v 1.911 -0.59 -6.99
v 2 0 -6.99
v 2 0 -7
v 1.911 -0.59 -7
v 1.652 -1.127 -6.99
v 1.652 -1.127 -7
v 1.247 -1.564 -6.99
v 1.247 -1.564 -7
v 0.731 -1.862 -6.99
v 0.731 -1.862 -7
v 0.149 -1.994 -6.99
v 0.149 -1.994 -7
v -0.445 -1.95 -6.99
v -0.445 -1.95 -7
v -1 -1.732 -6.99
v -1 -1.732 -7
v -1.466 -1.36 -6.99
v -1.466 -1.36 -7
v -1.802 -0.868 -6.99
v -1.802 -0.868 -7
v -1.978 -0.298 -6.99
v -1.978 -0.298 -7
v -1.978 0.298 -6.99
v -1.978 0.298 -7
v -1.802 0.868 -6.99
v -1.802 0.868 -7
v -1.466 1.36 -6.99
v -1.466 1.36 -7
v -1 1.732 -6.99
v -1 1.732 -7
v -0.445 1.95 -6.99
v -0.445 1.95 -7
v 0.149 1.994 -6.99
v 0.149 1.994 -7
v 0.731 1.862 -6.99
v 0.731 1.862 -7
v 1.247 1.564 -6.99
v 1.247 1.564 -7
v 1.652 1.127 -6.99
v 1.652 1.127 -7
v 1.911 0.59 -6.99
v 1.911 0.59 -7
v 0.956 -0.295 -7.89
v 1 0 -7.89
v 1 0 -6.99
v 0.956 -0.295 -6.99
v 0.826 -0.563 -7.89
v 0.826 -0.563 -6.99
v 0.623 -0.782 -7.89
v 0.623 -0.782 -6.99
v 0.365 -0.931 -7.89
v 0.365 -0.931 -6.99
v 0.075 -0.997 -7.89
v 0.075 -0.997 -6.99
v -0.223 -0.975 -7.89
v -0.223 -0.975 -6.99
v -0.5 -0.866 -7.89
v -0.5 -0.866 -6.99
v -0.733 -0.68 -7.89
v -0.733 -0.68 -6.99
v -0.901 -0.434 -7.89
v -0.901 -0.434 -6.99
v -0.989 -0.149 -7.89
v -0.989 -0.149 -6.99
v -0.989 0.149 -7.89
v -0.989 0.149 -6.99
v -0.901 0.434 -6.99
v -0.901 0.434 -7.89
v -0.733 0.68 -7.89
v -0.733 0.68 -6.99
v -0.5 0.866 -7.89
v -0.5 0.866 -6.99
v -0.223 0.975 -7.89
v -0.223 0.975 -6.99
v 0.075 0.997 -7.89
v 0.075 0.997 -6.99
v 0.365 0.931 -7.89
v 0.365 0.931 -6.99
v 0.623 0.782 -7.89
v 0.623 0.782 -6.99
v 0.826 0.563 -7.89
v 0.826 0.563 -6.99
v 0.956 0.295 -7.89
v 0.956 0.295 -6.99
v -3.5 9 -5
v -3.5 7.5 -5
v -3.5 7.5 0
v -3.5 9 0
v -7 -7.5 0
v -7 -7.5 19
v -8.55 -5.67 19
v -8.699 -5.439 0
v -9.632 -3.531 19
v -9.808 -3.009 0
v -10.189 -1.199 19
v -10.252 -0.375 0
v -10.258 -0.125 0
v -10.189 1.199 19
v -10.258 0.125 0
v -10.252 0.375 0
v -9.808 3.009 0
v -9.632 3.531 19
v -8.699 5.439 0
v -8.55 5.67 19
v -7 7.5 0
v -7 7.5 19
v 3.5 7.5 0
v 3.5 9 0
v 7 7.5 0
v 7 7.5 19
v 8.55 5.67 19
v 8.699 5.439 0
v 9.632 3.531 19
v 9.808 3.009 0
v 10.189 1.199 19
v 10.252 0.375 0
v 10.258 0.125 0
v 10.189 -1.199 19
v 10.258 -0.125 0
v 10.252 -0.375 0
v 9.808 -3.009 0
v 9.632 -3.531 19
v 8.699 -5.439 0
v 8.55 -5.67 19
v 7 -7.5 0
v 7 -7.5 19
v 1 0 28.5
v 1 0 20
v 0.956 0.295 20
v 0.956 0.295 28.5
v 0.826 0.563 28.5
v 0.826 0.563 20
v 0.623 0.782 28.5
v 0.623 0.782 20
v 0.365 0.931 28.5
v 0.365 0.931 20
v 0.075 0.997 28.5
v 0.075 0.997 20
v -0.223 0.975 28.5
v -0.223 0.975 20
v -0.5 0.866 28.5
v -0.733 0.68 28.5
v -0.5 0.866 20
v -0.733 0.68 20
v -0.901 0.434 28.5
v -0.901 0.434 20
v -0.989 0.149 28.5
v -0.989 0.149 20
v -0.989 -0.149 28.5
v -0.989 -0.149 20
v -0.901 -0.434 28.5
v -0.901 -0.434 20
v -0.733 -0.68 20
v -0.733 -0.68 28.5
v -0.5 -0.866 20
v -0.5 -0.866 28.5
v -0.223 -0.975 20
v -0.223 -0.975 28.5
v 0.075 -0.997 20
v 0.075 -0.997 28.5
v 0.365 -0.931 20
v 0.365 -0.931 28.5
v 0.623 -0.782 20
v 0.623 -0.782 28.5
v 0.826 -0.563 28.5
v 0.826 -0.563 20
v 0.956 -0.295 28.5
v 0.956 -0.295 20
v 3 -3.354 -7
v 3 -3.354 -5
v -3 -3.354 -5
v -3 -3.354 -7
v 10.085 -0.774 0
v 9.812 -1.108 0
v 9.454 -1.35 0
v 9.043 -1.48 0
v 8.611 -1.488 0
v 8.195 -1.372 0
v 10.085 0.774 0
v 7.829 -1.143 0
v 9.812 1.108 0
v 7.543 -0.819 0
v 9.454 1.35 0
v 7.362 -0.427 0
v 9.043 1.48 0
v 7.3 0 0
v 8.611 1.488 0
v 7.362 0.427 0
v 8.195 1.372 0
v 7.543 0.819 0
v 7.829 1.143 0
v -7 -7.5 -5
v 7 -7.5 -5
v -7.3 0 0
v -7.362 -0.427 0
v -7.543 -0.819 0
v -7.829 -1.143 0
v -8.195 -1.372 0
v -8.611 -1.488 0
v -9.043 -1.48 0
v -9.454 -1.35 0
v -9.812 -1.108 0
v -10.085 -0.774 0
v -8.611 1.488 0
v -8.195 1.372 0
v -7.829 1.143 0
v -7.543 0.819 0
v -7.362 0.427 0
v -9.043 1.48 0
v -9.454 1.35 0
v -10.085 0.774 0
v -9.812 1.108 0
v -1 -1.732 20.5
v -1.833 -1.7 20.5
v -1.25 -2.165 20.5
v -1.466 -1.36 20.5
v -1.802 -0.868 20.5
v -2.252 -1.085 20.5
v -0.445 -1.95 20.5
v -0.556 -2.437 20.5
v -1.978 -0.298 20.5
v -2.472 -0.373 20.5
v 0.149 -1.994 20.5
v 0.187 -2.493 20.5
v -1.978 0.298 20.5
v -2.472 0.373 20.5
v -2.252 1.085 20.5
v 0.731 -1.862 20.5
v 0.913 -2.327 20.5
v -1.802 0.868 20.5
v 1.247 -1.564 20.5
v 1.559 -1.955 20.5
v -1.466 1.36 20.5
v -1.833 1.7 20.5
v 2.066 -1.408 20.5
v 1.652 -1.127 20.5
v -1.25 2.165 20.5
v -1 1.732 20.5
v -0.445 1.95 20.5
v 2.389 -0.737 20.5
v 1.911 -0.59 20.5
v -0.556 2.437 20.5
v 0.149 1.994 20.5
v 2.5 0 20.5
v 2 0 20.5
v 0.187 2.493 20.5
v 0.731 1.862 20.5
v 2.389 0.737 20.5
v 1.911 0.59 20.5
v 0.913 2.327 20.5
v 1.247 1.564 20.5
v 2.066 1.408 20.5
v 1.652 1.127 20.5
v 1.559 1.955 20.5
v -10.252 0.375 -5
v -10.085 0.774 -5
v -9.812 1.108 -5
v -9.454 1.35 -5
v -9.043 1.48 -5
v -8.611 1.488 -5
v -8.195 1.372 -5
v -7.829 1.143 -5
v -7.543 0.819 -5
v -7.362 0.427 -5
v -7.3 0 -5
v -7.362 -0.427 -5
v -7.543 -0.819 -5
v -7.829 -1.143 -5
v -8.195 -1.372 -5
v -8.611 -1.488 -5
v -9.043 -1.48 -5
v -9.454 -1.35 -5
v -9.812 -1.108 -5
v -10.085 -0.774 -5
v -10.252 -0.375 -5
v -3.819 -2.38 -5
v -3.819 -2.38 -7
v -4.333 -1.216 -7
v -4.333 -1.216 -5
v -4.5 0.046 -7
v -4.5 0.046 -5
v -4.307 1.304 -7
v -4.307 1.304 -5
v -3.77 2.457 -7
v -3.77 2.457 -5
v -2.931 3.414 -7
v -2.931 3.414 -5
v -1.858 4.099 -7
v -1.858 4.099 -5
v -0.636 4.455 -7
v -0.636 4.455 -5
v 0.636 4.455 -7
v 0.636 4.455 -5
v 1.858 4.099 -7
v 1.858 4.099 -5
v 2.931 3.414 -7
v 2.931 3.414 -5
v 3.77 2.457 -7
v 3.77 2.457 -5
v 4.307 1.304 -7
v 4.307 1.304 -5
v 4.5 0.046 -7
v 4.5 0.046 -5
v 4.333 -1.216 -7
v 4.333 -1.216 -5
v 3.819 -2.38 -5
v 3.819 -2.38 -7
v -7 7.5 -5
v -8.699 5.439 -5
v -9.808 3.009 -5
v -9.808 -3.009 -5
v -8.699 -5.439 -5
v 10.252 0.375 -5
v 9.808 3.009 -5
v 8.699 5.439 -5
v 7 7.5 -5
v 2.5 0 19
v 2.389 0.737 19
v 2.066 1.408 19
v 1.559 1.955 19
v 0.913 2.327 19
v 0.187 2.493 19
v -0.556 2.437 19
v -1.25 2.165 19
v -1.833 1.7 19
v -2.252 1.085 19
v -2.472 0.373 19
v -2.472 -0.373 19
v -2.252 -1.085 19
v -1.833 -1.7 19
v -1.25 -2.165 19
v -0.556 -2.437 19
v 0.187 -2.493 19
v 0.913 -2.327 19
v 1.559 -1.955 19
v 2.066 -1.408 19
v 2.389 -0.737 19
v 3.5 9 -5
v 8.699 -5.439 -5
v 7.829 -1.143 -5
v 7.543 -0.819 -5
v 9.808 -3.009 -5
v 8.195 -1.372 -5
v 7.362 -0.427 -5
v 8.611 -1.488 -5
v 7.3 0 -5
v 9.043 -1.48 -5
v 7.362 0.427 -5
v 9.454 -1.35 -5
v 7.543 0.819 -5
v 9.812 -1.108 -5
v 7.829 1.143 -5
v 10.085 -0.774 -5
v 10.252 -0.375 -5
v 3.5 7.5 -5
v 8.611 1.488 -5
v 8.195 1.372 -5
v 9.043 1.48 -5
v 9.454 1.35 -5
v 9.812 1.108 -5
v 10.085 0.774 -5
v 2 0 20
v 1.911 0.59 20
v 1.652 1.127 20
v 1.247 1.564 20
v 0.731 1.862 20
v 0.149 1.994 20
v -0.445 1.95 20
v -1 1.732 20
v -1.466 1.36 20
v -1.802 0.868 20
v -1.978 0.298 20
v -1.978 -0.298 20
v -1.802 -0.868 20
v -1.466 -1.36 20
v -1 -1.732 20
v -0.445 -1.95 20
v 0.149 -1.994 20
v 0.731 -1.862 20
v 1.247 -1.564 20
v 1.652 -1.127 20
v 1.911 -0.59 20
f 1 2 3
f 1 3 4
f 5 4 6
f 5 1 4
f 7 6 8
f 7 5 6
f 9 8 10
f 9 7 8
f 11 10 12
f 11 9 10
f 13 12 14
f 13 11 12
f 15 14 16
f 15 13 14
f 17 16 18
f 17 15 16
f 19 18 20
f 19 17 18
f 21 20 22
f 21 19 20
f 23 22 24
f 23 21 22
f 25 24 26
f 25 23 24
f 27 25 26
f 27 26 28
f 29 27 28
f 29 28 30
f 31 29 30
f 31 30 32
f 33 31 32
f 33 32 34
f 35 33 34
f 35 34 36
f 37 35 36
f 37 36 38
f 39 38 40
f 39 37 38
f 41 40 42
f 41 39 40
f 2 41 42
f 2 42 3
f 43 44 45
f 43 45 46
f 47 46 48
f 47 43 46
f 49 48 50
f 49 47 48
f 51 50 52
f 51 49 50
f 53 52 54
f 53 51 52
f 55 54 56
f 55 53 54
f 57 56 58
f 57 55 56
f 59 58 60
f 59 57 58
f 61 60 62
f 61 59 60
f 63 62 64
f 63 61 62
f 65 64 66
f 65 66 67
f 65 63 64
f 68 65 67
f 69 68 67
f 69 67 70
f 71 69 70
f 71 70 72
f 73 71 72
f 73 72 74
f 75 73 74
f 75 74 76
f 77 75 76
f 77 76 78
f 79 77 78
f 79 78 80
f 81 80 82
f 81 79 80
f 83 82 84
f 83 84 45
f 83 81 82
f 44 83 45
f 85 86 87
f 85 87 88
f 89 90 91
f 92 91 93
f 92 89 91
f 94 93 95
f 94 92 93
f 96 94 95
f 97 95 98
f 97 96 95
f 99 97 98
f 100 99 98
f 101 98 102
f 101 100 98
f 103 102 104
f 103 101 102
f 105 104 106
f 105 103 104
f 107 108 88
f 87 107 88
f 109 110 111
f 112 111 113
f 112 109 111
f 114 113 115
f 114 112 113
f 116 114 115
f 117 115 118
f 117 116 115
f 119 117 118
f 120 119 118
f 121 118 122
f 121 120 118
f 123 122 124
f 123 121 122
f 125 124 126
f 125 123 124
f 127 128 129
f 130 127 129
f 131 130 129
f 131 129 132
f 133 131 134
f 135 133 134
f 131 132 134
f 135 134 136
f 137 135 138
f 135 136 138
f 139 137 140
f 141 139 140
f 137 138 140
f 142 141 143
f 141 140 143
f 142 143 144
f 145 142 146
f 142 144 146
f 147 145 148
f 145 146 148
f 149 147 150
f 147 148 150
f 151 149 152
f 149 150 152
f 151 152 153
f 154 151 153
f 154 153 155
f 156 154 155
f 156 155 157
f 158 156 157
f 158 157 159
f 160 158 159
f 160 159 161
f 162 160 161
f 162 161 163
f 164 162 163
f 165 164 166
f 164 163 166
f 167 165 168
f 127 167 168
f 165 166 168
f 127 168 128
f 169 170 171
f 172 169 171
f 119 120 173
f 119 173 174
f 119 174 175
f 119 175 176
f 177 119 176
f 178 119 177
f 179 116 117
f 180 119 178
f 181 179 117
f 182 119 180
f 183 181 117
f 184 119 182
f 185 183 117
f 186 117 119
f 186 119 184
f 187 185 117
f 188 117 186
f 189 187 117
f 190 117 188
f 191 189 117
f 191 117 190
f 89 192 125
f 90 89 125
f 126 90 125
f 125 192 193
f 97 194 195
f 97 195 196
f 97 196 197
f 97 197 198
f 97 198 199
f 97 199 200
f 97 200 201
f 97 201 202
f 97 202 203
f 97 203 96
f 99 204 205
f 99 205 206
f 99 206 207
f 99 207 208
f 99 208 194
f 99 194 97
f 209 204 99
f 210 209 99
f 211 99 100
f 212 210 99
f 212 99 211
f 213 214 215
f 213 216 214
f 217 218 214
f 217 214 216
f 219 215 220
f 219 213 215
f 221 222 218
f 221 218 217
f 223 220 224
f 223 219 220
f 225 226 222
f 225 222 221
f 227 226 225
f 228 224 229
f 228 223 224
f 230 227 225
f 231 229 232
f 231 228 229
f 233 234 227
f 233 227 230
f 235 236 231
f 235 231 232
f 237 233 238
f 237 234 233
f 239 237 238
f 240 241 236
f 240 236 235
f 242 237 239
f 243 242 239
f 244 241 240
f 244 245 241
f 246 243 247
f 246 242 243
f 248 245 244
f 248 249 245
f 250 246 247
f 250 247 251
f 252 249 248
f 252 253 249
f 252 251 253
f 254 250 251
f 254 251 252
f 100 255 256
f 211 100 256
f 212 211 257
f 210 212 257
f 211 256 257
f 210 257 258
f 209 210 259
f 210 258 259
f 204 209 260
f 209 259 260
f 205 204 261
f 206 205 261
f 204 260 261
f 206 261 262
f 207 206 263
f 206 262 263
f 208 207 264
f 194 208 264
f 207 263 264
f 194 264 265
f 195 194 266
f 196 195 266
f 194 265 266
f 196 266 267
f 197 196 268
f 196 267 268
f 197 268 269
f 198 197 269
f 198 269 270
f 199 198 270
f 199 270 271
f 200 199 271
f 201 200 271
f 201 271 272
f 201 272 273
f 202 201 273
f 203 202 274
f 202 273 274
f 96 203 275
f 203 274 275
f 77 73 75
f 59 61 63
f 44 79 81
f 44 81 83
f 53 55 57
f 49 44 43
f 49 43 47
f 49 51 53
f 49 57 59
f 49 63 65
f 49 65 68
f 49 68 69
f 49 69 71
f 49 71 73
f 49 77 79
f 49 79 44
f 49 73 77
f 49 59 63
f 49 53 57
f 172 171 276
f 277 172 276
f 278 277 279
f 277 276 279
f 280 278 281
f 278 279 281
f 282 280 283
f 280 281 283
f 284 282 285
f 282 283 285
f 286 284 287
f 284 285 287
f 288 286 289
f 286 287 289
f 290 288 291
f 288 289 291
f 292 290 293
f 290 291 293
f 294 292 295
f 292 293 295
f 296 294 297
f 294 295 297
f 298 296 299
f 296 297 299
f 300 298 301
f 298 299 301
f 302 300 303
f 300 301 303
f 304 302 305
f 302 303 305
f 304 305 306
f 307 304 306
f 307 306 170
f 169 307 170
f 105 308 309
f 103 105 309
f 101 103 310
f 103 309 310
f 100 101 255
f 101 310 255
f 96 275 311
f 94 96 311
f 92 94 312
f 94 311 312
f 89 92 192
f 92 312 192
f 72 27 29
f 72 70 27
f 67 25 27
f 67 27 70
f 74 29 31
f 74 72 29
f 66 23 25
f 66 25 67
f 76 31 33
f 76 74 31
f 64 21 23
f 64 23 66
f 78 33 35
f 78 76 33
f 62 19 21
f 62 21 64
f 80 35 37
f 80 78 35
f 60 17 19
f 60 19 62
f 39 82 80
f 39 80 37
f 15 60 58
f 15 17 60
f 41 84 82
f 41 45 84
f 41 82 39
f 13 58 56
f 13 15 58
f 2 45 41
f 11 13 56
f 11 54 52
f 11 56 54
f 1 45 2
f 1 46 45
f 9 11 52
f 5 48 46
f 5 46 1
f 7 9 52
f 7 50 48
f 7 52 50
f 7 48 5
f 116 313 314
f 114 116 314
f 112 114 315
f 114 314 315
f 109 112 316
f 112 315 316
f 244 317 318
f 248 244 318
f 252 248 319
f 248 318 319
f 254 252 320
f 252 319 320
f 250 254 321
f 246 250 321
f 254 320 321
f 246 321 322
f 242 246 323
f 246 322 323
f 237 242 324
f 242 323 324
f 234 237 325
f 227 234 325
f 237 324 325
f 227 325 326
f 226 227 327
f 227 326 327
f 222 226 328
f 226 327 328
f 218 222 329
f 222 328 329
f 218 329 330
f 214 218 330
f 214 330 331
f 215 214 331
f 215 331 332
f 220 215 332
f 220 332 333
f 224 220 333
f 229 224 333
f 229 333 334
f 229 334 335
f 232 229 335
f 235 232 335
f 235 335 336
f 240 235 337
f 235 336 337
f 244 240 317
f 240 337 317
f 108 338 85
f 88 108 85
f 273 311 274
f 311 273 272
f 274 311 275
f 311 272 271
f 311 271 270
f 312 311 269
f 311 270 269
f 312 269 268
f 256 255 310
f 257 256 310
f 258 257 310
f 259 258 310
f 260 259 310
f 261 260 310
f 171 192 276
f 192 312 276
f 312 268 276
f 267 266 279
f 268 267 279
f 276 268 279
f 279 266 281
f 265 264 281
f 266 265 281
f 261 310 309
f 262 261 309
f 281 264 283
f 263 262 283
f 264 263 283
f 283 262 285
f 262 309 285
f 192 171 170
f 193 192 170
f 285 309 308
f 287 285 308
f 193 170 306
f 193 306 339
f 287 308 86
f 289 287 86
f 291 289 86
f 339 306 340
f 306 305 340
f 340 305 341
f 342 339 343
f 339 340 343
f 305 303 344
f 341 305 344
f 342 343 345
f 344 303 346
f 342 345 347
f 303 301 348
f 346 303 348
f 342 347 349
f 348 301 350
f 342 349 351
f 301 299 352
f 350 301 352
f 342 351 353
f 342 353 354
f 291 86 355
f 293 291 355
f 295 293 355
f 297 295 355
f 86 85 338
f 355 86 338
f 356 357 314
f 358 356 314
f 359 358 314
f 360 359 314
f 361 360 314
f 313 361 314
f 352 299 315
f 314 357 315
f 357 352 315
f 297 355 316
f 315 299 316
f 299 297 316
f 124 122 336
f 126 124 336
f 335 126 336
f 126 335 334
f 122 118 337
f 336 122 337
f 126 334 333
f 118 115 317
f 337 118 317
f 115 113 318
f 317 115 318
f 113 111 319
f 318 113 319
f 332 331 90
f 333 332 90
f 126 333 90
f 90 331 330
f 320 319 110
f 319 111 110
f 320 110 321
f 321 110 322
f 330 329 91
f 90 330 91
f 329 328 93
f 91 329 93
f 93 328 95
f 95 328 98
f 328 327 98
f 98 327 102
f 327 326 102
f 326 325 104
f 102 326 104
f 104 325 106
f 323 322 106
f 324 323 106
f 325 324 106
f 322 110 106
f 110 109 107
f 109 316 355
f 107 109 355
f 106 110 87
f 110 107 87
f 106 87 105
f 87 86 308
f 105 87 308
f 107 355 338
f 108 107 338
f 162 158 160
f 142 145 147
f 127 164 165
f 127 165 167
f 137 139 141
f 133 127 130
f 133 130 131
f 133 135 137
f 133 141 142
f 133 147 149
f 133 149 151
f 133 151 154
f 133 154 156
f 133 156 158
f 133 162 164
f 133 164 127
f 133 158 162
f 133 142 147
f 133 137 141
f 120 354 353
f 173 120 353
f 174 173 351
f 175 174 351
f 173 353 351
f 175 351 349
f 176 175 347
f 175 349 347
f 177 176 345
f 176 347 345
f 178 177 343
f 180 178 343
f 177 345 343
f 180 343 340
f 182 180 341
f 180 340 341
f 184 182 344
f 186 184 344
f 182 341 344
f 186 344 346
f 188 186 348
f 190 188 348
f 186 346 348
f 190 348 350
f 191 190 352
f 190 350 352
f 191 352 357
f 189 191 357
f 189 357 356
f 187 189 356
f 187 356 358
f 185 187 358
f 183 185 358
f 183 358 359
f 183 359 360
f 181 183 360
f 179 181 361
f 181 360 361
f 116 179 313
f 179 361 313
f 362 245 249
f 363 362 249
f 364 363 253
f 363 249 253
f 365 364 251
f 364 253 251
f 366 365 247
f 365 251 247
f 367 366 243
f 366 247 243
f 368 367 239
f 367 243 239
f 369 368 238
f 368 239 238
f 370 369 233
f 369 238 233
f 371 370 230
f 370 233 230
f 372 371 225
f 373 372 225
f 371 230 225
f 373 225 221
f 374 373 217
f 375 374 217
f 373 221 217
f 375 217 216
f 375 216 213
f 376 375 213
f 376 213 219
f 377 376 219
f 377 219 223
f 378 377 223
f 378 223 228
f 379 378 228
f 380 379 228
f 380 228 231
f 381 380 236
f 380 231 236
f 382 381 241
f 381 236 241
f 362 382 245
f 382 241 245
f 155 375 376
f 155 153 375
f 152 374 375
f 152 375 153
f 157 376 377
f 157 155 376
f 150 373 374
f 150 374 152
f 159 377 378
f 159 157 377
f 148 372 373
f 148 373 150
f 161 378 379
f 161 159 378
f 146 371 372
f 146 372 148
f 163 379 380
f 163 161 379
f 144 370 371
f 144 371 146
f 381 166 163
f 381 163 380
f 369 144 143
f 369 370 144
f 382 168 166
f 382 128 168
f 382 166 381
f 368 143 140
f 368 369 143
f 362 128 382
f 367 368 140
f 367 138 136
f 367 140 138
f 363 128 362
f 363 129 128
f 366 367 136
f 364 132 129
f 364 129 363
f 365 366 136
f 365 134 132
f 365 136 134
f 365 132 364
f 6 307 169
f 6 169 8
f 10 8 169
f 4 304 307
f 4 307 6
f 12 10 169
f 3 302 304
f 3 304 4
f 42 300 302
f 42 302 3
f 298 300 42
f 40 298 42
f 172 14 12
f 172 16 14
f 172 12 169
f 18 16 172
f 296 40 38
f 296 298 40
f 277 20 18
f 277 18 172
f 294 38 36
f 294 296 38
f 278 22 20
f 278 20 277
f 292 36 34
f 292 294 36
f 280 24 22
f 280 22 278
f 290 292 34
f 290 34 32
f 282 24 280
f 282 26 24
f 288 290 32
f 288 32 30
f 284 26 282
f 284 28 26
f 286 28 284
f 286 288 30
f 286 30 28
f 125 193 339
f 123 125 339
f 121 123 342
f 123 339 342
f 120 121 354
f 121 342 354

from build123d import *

# Parameters (mm, degrees)
SALIENTE_EXTRUIR2_DEPTH = 19
CROQUIS3_R              = 2.5
SALIENTE_EXTRUIR3_DEPTH = 1.5
CROQUIS4_R              = 2
CORTAR_EXTRUIR1_DEPTH   = 0.5
CROQUIS5_R              = 1
SALIENTE_EXTRUIR4_DEPTH = 8.5
SALIENTE_EXTRUIR5_START = 5
SALIENTE_EXTRUIR5_DEPTH = 5
SALIENTE_EXTRUIR6_DEPTH = 2
CORTAR_EXTRUIR2_START   = -0.01
CROQUIS8_R              = 2
CORTAR_EXTRUIR2_DEPTH   = 0.01
SALIENTE_EXTRUIR7_START = 0.9
CROQUIS9_R              = 1
SALIENTE_EXTRUIR7_DEPTH = 0.9
CROQUIS10_W             = 7
CROQUIS10_H             = 1.5
SALIENTE_EXTRUIR8_DEPTH = 5


with BuildPart() as part:
    # Croquis2 → Saliente-Extruir2 (new body)
    with BuildSketch(Plane.XY):
        with BuildLine():
            Line((-7, 7.5), (7, 7.5))
            ThreePointArc((7, 7.5), (10.259142264, 0), (7, -7.5))
            Line((7, -7.5), (-7, -7.5))
            ThreePointArc((-7, -7.5), (-10.259142264, 0), (-7, 7.5))
        make_face()
    extrude(amount=SALIENTE_EXTRUIR2_DEPTH)

    # Croquis3 → Saliente-Extruir3 (add)
    with BuildSketch(Plane.XY.offset(19)):
        Circle(CROQUIS3_R)
    extrude(amount=SALIENTE_EXTRUIR3_DEPTH)

    # Croquis4 → Cortar-Extruir1 (cut)
    with BuildSketch(Plane.XY.offset(20.5)):
        Circle(CROQUIS4_R)
    extrude(amount=-CORTAR_EXTRUIR1_DEPTH, mode=Mode.SUBTRACT)

    # Croquis5 → Saliente-Extruir4 (add)
    with BuildSketch(Plane.XY.offset(20)):
        Circle(CROQUIS5_R)
    extrude(amount=SALIENTE_EXTRUIR4_DEPTH)

    # Croquis6 → Saliente-Extruir5 (add)
    with BuildSketch(Plane(origin=(0, 0, 0), x_dir=(-1, 0, 0), z_dir=(0, 0, -1)).offset(SALIENTE_EXTRUIR5_START)):
        with BuildLine():
            Line((-7, 7.5), (7, 7.5))
            ThreePointArc((7, 7.5), (9.332754717, 4.260245227), (10.252272727, 0.375371717))
            ThreePointArc((10.252272727, 0.375371717), (7.3, 0), (10.252272727, -0.375371717))
            ThreePointArc((10.252272727, -0.375371717), (9.332754717, -4.260245227), (7, -7.5))
            Line((7, -7.5), (-7, -7.5))
            ThreePointArc((-7, -7.5), (-9.332754717, -4.260245227), (-10.252272727, -0.375371717))
            ThreePointArc((-10.252272727, -0.375371717), (-7.3, 0), (-10.252272727, 0.375371717))
            ThreePointArc((-10.252272727, 0.375371717), (-9.332754717, 4.260245227), (-7, 7.5))
        make_face()
    extrude(amount=-SALIENTE_EXTRUIR5_DEPTH)

    # Croquis7 → Saliente-Extruir6 (add)
    with BuildSketch(Plane(origin=(0, 0, -5), x_dir=(-1, 0, 0), z_dir=(0, 0, -1))):
        with BuildLine():
            Line((-3, -3.354101966), (3, -3.354101966))
            ThreePointArc((3, -3.354101966), (0, 4.5), (-3, -3.354101966))
        make_face()
    extrude(amount=SALIENTE_EXTRUIR6_DEPTH)

    # Croquis8 → Cortar-Extruir2 (cut)
    with BuildSketch(Plane(origin=(0, 0, -7), x_dir=(-1, 0, 0), z_dir=(0, 0, -1)).offset(CORTAR_EXTRUIR2_START)):
        with Locations(Location((0, 0, 0), (0, 0, 180))):
            Circle(CROQUIS8_R)
    extrude(amount=CORTAR_EXTRUIR2_DEPTH, mode=Mode.SUBTRACT)

    # Croquis9 → Saliente-Extruir7 (add)
    with BuildSketch(Plane(origin=(0, 0, -6.99), x_dir=(-1, 0, 0), z_dir=(0, 0, -1)).offset(SALIENTE_EXTRUIR7_START)):
        with Locations(Location((0, 0, 0), (0, 0, 180))):
            Circle(CROQUIS9_R)
    extrude(amount=-SALIENTE_EXTRUIR7_DEPTH)

    # Croquis10 → Saliente-Extruir8 (add)
    with BuildSketch(Plane(origin=(0, 0, -5), x_dir=(-1, 0, 0), z_dir=(0, 0, -1))):
        with Locations((0, 8.25)):
            Rectangle(CROQUIS10_W, CROQUIS10_H)
    extrude(amount=-SALIENTE_EXTRUIR8_DEPTH)


solid = part.part
